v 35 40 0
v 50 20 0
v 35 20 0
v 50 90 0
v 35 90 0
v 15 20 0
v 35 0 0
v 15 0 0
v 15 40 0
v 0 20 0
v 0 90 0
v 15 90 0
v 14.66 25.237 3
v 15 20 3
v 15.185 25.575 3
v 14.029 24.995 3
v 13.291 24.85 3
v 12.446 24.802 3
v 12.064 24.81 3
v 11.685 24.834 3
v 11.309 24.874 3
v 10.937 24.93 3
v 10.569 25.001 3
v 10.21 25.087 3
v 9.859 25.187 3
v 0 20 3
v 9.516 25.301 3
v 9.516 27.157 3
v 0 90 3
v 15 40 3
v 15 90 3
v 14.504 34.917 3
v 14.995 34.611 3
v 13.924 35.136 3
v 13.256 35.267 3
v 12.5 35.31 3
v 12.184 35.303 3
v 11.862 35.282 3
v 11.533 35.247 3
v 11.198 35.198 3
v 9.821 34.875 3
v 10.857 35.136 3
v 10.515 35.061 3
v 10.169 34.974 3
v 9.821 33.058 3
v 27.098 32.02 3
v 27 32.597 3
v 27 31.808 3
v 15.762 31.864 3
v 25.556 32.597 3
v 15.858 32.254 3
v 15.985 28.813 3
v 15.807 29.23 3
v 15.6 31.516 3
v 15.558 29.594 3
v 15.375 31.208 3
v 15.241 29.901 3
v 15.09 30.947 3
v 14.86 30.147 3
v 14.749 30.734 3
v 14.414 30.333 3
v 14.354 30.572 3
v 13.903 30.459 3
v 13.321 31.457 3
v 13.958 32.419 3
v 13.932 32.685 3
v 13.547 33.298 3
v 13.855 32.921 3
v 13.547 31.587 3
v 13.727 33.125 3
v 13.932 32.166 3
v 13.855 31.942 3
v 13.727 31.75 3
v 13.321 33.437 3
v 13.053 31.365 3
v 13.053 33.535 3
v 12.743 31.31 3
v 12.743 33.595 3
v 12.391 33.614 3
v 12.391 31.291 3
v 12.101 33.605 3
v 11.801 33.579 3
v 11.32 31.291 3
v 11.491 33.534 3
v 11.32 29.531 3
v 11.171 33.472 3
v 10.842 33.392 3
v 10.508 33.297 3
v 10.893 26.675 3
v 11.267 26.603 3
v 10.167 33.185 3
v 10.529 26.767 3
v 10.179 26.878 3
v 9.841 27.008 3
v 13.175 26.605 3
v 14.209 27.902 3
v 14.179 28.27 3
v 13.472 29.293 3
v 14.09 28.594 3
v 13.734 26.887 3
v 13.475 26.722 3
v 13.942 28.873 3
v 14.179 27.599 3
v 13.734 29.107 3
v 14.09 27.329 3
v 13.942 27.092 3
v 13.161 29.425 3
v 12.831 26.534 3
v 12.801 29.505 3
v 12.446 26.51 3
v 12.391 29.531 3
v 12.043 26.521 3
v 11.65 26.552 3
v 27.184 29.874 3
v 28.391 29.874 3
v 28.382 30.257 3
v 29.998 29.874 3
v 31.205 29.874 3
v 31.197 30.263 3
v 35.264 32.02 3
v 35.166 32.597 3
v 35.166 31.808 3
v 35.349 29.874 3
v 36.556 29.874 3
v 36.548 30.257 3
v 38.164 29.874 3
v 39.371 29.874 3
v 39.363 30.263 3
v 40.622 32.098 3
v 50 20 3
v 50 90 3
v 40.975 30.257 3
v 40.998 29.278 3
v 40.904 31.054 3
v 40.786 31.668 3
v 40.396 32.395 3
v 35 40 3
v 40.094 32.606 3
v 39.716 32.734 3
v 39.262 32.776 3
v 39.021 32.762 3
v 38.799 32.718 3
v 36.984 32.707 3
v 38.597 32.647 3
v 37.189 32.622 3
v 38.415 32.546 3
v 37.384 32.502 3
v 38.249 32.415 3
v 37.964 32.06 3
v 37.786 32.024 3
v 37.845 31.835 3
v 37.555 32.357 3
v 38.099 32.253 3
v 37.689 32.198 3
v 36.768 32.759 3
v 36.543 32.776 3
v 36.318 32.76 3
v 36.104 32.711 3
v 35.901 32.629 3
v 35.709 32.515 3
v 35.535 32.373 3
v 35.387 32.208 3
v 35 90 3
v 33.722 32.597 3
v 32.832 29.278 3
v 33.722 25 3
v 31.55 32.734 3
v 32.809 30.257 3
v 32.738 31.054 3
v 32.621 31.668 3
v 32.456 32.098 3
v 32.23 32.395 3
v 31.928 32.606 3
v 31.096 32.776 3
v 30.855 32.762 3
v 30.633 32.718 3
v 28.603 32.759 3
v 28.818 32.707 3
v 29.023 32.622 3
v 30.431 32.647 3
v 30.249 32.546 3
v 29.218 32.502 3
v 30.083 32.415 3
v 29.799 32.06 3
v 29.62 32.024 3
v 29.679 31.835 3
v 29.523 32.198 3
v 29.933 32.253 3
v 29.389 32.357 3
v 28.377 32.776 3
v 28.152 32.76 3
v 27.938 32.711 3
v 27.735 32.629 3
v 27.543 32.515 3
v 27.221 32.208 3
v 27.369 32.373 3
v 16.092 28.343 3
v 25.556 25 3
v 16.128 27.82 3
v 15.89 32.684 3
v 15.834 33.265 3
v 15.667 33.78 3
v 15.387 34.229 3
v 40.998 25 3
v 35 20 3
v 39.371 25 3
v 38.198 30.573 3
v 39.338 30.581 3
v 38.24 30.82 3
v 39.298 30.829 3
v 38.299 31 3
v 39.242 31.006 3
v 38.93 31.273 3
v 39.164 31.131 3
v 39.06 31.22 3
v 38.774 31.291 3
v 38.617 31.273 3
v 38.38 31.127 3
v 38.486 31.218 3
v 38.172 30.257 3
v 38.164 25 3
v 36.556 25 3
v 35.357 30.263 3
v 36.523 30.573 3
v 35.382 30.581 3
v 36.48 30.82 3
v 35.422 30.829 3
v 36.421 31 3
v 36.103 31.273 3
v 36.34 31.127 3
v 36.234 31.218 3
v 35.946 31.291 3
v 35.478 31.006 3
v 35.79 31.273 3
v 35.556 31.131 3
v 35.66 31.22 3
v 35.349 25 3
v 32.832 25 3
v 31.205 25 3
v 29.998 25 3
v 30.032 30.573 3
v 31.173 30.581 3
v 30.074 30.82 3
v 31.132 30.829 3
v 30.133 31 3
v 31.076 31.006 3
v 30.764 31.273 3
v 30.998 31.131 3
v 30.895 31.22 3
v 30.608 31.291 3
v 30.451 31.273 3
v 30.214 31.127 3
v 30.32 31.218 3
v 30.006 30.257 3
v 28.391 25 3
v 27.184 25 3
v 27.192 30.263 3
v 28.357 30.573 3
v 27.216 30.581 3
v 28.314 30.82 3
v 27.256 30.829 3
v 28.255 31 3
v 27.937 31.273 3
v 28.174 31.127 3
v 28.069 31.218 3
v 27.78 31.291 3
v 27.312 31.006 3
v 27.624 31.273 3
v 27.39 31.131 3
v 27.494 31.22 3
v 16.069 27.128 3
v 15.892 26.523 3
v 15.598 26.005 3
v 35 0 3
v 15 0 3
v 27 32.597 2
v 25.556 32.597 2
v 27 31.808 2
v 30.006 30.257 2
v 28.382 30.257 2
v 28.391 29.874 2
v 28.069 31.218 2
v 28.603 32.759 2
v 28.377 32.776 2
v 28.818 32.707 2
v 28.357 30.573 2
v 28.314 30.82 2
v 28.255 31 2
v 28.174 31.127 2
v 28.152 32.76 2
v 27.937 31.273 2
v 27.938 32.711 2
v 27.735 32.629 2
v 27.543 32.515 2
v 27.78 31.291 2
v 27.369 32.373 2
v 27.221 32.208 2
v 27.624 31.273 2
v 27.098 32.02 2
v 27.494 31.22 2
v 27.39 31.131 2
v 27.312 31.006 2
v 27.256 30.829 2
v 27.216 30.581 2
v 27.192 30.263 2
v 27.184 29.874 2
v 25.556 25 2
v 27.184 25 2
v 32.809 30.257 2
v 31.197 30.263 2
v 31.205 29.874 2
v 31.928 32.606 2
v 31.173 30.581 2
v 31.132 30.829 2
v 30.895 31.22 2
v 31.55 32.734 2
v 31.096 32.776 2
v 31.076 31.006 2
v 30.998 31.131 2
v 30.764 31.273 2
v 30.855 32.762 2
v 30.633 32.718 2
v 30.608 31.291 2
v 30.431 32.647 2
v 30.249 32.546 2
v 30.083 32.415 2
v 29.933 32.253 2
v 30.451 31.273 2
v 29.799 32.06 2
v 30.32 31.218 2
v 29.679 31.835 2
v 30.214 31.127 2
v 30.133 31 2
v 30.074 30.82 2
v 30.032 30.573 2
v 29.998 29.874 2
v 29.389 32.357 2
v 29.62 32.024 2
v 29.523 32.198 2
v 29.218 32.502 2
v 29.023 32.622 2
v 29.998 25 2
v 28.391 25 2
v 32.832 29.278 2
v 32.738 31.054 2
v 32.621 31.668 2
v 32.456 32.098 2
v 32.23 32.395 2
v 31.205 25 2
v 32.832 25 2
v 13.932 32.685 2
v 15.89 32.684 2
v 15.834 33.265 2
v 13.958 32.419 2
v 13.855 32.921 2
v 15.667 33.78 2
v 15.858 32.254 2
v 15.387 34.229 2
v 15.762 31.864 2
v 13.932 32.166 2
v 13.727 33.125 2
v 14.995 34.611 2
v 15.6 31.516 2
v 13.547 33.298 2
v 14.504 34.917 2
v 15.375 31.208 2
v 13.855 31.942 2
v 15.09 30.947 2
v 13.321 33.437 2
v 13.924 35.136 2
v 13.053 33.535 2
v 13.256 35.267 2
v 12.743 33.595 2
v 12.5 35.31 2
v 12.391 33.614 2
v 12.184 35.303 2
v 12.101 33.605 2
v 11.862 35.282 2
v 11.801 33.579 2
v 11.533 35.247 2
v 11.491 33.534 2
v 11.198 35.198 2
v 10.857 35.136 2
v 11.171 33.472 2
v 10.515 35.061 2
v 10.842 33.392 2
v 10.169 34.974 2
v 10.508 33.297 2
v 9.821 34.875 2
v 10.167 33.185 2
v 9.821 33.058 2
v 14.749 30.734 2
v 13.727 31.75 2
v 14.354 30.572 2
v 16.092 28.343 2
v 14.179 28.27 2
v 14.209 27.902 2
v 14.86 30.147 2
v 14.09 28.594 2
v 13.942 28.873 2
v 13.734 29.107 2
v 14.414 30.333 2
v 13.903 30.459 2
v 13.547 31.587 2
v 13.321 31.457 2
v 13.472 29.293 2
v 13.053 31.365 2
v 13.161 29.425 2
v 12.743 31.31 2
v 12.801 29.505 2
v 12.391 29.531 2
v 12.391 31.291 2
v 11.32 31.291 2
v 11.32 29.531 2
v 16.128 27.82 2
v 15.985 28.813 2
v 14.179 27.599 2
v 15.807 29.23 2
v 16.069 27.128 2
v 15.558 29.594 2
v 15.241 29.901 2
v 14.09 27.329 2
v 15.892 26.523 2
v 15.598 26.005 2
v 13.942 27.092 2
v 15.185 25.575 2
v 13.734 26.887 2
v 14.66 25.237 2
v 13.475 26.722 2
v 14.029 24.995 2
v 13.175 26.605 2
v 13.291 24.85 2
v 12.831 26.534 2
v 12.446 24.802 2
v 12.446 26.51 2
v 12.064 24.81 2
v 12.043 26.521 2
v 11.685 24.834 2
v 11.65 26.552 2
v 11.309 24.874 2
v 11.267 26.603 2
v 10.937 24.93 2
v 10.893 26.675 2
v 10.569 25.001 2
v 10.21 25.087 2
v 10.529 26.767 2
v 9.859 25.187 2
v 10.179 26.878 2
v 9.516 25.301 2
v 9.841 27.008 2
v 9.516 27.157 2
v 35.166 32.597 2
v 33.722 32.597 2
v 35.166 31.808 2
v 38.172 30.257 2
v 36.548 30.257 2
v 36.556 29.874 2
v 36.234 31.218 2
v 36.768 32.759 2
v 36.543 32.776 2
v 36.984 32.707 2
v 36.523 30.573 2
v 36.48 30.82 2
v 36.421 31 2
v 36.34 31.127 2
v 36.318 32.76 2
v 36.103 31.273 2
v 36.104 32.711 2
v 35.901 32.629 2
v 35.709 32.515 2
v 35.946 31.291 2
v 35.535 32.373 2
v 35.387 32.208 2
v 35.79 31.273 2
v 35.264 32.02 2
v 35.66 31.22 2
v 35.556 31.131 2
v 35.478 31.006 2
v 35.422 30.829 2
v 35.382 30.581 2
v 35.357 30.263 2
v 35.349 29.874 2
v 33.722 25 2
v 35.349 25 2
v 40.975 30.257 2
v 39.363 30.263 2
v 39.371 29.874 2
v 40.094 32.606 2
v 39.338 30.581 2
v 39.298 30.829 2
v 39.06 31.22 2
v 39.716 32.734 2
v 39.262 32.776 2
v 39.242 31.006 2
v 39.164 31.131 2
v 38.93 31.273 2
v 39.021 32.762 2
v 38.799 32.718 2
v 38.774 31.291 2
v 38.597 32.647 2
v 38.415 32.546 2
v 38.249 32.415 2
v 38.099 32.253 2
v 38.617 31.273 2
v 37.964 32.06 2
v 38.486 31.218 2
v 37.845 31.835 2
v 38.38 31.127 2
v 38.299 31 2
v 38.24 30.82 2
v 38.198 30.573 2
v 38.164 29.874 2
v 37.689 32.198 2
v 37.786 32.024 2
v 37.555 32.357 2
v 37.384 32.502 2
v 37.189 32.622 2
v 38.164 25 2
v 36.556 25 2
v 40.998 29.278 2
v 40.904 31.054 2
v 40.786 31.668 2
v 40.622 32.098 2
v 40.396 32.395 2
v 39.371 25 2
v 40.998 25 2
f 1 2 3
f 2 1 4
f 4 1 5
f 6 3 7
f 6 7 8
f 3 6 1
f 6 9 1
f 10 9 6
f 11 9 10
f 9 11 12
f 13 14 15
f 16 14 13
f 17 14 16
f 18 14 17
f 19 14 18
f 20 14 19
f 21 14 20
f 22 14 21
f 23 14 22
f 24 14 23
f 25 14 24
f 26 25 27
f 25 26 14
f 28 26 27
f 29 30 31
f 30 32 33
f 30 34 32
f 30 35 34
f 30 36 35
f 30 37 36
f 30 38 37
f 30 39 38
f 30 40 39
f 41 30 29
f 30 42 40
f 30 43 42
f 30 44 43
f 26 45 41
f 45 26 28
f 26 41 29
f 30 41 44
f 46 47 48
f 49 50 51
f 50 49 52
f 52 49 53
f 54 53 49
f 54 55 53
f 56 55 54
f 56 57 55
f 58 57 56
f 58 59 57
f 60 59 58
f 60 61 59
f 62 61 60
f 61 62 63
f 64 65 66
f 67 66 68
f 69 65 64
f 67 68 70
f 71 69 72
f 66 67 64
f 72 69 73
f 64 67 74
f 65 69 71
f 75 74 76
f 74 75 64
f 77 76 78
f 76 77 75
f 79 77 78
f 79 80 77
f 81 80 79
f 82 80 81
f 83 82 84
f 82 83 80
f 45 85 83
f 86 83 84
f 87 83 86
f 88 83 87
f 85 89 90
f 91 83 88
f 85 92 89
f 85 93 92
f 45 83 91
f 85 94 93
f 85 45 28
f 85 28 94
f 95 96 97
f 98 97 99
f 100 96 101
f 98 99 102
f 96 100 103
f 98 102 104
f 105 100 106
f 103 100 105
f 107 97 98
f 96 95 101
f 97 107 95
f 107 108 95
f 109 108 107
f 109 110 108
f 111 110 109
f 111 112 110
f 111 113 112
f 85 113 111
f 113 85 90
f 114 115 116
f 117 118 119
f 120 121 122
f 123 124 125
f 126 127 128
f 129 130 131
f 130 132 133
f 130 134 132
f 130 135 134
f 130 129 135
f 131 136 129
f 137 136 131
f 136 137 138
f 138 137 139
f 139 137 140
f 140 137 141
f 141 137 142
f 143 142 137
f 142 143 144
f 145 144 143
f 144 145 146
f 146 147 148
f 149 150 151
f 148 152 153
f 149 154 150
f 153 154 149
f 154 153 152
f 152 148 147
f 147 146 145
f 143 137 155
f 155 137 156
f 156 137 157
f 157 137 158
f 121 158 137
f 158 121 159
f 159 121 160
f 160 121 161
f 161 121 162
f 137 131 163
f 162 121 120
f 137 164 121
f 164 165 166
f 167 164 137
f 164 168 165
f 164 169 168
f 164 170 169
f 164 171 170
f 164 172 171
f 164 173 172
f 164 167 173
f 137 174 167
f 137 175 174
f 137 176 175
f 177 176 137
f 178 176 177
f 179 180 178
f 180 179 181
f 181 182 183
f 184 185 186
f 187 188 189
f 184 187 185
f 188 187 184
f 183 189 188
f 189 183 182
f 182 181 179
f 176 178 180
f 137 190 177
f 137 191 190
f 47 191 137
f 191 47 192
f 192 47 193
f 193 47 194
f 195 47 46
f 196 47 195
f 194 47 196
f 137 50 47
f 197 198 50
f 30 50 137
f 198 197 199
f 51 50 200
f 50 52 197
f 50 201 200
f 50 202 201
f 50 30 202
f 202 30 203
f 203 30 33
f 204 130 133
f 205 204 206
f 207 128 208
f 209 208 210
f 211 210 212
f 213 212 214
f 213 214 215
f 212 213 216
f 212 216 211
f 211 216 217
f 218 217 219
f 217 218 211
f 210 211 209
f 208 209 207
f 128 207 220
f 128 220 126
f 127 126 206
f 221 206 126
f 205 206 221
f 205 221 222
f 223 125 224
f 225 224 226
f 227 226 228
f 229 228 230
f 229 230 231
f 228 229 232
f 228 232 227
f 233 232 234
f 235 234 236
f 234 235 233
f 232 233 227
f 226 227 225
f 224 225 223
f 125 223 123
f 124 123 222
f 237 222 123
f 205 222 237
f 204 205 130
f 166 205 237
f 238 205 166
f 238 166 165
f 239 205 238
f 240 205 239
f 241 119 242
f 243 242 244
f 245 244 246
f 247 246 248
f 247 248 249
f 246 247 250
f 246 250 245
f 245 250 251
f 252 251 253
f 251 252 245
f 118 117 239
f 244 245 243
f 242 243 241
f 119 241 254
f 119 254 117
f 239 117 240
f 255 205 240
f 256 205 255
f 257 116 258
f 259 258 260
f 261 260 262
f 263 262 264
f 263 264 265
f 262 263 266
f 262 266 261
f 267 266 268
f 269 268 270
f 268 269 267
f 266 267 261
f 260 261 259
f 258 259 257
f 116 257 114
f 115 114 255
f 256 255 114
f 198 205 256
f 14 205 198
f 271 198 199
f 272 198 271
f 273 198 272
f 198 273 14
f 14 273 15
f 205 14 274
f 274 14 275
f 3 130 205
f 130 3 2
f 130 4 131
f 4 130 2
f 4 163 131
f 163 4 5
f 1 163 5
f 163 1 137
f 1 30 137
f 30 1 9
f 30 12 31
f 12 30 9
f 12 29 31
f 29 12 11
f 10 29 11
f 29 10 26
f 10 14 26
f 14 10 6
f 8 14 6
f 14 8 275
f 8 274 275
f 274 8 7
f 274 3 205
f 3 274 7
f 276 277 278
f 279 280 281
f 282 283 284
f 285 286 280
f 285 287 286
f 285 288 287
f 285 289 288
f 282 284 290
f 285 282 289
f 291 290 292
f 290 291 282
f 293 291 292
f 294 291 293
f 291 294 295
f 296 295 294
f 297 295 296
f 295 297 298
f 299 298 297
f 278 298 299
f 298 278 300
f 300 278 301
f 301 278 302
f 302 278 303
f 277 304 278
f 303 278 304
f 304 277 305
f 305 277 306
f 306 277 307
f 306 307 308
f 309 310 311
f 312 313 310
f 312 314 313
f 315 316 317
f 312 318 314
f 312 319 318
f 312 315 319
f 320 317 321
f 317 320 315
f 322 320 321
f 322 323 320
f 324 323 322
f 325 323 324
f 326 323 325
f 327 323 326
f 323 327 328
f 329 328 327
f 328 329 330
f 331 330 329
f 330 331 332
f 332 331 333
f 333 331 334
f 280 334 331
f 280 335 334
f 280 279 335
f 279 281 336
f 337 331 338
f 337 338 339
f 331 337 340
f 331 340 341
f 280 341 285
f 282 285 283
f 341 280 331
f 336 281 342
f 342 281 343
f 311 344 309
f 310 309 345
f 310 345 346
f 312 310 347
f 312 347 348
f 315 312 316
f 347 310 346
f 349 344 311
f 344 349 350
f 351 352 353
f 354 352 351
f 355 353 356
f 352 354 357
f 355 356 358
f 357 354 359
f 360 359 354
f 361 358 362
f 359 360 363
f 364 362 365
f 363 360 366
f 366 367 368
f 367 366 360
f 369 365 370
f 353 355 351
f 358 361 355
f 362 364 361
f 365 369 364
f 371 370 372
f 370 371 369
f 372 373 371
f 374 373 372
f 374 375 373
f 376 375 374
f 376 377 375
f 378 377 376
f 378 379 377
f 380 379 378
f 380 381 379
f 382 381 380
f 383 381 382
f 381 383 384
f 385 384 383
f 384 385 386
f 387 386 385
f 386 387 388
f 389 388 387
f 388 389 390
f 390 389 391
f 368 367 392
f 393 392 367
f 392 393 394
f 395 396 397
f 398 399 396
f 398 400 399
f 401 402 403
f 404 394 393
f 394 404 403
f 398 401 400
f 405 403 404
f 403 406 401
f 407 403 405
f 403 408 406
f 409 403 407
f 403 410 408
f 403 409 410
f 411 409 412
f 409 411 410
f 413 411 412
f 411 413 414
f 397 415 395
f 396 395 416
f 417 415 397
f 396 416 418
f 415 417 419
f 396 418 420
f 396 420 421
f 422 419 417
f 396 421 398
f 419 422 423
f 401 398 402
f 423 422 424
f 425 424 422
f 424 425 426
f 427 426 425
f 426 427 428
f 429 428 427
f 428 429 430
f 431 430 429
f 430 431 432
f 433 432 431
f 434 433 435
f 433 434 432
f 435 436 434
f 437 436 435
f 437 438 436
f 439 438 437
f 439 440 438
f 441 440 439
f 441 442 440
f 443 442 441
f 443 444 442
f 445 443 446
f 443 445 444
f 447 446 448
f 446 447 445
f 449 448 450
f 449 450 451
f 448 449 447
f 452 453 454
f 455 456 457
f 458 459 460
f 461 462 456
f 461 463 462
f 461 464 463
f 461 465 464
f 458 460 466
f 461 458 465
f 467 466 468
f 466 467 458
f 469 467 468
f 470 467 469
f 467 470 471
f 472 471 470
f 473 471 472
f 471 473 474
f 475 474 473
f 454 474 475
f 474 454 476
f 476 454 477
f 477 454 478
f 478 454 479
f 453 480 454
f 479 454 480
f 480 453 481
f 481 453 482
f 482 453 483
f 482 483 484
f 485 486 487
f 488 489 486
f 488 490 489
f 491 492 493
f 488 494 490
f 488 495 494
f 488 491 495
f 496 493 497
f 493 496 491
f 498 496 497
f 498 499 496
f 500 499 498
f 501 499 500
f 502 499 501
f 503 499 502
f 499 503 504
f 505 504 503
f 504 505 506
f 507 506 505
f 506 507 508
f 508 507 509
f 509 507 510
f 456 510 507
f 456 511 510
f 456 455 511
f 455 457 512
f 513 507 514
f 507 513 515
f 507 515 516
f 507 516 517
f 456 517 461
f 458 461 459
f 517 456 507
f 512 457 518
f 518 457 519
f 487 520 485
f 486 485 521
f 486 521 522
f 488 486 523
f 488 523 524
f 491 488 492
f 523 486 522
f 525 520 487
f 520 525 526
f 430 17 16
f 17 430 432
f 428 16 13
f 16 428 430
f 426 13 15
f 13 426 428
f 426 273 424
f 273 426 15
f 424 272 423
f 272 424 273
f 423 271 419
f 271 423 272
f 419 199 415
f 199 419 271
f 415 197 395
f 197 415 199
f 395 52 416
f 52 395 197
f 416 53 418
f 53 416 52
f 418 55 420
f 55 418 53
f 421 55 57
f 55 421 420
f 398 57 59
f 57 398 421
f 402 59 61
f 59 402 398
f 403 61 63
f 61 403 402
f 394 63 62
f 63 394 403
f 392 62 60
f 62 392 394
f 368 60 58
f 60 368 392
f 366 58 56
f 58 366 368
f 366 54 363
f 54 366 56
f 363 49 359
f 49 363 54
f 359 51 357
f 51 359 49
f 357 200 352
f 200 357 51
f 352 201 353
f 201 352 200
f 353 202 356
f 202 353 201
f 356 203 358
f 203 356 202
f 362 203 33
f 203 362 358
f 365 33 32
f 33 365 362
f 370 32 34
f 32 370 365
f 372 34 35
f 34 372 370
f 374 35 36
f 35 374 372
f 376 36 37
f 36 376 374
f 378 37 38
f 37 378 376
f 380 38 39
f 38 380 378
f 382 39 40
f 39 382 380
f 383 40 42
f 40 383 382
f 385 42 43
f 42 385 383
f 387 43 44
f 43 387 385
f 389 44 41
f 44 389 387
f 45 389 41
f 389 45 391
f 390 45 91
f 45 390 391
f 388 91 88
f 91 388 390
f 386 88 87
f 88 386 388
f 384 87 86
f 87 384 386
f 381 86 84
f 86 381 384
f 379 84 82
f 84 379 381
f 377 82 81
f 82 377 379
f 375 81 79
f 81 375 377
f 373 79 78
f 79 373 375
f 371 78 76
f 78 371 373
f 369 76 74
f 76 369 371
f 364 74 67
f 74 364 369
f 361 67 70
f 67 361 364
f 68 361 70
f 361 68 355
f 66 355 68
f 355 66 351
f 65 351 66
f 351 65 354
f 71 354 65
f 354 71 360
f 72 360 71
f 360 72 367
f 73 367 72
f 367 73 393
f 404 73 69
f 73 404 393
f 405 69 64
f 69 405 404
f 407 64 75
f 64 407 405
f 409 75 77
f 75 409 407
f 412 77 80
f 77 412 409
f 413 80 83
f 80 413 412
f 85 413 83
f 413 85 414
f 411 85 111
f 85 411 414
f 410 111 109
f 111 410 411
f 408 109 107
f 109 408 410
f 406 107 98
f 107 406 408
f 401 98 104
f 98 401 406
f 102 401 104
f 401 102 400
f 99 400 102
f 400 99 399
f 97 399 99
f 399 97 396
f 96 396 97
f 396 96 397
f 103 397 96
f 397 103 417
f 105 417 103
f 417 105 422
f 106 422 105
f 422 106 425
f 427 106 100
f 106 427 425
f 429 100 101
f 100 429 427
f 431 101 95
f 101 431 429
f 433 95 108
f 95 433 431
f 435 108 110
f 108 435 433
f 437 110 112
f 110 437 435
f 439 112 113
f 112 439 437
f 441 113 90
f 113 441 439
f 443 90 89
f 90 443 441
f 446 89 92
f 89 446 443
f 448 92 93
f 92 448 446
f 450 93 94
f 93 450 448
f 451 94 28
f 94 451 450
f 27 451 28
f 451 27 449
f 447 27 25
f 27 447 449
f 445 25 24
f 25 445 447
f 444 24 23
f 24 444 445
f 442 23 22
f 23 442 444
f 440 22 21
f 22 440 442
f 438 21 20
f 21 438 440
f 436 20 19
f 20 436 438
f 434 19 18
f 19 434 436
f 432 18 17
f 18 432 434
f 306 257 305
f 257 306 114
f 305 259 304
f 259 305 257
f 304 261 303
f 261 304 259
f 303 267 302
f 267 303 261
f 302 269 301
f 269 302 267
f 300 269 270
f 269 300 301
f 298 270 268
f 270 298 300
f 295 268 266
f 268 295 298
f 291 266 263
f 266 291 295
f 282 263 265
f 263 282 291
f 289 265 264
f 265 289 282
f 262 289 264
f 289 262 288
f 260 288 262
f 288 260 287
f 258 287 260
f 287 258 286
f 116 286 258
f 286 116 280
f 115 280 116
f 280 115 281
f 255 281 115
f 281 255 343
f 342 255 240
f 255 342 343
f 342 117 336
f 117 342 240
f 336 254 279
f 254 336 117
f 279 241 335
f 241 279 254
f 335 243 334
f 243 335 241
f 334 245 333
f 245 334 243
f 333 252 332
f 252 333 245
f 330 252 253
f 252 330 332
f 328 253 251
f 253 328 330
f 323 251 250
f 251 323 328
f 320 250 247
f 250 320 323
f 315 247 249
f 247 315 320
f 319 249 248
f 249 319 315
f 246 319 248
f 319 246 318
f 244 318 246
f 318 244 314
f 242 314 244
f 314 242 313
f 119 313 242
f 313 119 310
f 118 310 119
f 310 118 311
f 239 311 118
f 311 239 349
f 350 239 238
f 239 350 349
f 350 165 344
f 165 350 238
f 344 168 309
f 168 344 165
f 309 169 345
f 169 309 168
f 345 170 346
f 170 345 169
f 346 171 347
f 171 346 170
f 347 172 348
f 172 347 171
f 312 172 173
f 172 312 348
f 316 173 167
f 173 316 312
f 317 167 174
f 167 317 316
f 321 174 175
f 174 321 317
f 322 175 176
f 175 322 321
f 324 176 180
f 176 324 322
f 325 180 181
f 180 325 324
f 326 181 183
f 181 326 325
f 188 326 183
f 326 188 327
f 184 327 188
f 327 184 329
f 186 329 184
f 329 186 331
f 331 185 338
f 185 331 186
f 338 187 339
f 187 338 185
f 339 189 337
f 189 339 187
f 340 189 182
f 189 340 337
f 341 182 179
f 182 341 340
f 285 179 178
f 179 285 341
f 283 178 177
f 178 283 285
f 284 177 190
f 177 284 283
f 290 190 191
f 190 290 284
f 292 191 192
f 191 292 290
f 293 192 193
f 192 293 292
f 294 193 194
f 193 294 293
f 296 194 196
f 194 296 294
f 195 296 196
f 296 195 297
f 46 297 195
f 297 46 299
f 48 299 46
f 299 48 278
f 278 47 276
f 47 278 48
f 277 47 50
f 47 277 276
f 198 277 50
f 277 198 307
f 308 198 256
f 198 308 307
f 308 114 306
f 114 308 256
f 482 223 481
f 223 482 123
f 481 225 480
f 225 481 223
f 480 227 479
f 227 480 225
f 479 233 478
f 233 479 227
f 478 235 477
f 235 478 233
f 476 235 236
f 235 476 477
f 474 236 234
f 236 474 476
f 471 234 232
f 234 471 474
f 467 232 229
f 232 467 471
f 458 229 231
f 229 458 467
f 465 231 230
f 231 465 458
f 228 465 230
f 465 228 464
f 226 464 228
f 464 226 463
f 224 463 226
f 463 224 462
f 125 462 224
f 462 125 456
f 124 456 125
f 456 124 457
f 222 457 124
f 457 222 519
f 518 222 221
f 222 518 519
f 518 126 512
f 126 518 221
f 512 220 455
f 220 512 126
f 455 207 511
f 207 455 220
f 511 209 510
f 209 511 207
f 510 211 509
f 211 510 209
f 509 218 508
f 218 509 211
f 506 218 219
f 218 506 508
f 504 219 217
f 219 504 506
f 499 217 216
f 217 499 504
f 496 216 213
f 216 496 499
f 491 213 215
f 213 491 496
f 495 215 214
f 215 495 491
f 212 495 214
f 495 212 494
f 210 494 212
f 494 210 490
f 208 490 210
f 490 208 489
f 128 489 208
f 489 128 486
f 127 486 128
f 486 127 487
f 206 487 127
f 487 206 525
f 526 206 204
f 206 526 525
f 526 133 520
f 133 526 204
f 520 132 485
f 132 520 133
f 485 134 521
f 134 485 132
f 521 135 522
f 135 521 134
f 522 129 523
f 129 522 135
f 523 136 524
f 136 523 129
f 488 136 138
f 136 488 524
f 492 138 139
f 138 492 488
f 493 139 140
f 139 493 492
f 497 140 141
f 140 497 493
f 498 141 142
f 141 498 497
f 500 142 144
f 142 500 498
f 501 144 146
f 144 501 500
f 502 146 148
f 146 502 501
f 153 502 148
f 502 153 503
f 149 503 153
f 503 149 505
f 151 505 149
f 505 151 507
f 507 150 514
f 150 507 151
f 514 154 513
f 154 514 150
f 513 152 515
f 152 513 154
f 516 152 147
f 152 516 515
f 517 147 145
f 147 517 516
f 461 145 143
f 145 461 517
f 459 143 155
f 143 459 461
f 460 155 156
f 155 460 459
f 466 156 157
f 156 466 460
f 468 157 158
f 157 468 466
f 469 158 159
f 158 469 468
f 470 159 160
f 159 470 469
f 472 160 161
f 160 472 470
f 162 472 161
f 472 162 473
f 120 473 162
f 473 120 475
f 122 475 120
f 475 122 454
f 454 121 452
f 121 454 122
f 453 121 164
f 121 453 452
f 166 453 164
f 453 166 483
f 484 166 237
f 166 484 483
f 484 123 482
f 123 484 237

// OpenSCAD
shim_thickness=3;

difference() {
    forme();
    texte();
}

module forme() {
    linear_extrude(height = shim_thickness)
    polygon([[15,0], [15,20], [0,20], [0,90], [15,90], [15,40], [35,40], [35,90], [50,90], [50,20], [35,20], [35,0]]);
}

module texte() {
    color([1,0,0])
    translate([25,25,shim_thickness-1])
    linear_extrude(height = 1)
    text(str(shim_thickness, " mm"), font = "Consolas:style=Bold", halign="center");
}
